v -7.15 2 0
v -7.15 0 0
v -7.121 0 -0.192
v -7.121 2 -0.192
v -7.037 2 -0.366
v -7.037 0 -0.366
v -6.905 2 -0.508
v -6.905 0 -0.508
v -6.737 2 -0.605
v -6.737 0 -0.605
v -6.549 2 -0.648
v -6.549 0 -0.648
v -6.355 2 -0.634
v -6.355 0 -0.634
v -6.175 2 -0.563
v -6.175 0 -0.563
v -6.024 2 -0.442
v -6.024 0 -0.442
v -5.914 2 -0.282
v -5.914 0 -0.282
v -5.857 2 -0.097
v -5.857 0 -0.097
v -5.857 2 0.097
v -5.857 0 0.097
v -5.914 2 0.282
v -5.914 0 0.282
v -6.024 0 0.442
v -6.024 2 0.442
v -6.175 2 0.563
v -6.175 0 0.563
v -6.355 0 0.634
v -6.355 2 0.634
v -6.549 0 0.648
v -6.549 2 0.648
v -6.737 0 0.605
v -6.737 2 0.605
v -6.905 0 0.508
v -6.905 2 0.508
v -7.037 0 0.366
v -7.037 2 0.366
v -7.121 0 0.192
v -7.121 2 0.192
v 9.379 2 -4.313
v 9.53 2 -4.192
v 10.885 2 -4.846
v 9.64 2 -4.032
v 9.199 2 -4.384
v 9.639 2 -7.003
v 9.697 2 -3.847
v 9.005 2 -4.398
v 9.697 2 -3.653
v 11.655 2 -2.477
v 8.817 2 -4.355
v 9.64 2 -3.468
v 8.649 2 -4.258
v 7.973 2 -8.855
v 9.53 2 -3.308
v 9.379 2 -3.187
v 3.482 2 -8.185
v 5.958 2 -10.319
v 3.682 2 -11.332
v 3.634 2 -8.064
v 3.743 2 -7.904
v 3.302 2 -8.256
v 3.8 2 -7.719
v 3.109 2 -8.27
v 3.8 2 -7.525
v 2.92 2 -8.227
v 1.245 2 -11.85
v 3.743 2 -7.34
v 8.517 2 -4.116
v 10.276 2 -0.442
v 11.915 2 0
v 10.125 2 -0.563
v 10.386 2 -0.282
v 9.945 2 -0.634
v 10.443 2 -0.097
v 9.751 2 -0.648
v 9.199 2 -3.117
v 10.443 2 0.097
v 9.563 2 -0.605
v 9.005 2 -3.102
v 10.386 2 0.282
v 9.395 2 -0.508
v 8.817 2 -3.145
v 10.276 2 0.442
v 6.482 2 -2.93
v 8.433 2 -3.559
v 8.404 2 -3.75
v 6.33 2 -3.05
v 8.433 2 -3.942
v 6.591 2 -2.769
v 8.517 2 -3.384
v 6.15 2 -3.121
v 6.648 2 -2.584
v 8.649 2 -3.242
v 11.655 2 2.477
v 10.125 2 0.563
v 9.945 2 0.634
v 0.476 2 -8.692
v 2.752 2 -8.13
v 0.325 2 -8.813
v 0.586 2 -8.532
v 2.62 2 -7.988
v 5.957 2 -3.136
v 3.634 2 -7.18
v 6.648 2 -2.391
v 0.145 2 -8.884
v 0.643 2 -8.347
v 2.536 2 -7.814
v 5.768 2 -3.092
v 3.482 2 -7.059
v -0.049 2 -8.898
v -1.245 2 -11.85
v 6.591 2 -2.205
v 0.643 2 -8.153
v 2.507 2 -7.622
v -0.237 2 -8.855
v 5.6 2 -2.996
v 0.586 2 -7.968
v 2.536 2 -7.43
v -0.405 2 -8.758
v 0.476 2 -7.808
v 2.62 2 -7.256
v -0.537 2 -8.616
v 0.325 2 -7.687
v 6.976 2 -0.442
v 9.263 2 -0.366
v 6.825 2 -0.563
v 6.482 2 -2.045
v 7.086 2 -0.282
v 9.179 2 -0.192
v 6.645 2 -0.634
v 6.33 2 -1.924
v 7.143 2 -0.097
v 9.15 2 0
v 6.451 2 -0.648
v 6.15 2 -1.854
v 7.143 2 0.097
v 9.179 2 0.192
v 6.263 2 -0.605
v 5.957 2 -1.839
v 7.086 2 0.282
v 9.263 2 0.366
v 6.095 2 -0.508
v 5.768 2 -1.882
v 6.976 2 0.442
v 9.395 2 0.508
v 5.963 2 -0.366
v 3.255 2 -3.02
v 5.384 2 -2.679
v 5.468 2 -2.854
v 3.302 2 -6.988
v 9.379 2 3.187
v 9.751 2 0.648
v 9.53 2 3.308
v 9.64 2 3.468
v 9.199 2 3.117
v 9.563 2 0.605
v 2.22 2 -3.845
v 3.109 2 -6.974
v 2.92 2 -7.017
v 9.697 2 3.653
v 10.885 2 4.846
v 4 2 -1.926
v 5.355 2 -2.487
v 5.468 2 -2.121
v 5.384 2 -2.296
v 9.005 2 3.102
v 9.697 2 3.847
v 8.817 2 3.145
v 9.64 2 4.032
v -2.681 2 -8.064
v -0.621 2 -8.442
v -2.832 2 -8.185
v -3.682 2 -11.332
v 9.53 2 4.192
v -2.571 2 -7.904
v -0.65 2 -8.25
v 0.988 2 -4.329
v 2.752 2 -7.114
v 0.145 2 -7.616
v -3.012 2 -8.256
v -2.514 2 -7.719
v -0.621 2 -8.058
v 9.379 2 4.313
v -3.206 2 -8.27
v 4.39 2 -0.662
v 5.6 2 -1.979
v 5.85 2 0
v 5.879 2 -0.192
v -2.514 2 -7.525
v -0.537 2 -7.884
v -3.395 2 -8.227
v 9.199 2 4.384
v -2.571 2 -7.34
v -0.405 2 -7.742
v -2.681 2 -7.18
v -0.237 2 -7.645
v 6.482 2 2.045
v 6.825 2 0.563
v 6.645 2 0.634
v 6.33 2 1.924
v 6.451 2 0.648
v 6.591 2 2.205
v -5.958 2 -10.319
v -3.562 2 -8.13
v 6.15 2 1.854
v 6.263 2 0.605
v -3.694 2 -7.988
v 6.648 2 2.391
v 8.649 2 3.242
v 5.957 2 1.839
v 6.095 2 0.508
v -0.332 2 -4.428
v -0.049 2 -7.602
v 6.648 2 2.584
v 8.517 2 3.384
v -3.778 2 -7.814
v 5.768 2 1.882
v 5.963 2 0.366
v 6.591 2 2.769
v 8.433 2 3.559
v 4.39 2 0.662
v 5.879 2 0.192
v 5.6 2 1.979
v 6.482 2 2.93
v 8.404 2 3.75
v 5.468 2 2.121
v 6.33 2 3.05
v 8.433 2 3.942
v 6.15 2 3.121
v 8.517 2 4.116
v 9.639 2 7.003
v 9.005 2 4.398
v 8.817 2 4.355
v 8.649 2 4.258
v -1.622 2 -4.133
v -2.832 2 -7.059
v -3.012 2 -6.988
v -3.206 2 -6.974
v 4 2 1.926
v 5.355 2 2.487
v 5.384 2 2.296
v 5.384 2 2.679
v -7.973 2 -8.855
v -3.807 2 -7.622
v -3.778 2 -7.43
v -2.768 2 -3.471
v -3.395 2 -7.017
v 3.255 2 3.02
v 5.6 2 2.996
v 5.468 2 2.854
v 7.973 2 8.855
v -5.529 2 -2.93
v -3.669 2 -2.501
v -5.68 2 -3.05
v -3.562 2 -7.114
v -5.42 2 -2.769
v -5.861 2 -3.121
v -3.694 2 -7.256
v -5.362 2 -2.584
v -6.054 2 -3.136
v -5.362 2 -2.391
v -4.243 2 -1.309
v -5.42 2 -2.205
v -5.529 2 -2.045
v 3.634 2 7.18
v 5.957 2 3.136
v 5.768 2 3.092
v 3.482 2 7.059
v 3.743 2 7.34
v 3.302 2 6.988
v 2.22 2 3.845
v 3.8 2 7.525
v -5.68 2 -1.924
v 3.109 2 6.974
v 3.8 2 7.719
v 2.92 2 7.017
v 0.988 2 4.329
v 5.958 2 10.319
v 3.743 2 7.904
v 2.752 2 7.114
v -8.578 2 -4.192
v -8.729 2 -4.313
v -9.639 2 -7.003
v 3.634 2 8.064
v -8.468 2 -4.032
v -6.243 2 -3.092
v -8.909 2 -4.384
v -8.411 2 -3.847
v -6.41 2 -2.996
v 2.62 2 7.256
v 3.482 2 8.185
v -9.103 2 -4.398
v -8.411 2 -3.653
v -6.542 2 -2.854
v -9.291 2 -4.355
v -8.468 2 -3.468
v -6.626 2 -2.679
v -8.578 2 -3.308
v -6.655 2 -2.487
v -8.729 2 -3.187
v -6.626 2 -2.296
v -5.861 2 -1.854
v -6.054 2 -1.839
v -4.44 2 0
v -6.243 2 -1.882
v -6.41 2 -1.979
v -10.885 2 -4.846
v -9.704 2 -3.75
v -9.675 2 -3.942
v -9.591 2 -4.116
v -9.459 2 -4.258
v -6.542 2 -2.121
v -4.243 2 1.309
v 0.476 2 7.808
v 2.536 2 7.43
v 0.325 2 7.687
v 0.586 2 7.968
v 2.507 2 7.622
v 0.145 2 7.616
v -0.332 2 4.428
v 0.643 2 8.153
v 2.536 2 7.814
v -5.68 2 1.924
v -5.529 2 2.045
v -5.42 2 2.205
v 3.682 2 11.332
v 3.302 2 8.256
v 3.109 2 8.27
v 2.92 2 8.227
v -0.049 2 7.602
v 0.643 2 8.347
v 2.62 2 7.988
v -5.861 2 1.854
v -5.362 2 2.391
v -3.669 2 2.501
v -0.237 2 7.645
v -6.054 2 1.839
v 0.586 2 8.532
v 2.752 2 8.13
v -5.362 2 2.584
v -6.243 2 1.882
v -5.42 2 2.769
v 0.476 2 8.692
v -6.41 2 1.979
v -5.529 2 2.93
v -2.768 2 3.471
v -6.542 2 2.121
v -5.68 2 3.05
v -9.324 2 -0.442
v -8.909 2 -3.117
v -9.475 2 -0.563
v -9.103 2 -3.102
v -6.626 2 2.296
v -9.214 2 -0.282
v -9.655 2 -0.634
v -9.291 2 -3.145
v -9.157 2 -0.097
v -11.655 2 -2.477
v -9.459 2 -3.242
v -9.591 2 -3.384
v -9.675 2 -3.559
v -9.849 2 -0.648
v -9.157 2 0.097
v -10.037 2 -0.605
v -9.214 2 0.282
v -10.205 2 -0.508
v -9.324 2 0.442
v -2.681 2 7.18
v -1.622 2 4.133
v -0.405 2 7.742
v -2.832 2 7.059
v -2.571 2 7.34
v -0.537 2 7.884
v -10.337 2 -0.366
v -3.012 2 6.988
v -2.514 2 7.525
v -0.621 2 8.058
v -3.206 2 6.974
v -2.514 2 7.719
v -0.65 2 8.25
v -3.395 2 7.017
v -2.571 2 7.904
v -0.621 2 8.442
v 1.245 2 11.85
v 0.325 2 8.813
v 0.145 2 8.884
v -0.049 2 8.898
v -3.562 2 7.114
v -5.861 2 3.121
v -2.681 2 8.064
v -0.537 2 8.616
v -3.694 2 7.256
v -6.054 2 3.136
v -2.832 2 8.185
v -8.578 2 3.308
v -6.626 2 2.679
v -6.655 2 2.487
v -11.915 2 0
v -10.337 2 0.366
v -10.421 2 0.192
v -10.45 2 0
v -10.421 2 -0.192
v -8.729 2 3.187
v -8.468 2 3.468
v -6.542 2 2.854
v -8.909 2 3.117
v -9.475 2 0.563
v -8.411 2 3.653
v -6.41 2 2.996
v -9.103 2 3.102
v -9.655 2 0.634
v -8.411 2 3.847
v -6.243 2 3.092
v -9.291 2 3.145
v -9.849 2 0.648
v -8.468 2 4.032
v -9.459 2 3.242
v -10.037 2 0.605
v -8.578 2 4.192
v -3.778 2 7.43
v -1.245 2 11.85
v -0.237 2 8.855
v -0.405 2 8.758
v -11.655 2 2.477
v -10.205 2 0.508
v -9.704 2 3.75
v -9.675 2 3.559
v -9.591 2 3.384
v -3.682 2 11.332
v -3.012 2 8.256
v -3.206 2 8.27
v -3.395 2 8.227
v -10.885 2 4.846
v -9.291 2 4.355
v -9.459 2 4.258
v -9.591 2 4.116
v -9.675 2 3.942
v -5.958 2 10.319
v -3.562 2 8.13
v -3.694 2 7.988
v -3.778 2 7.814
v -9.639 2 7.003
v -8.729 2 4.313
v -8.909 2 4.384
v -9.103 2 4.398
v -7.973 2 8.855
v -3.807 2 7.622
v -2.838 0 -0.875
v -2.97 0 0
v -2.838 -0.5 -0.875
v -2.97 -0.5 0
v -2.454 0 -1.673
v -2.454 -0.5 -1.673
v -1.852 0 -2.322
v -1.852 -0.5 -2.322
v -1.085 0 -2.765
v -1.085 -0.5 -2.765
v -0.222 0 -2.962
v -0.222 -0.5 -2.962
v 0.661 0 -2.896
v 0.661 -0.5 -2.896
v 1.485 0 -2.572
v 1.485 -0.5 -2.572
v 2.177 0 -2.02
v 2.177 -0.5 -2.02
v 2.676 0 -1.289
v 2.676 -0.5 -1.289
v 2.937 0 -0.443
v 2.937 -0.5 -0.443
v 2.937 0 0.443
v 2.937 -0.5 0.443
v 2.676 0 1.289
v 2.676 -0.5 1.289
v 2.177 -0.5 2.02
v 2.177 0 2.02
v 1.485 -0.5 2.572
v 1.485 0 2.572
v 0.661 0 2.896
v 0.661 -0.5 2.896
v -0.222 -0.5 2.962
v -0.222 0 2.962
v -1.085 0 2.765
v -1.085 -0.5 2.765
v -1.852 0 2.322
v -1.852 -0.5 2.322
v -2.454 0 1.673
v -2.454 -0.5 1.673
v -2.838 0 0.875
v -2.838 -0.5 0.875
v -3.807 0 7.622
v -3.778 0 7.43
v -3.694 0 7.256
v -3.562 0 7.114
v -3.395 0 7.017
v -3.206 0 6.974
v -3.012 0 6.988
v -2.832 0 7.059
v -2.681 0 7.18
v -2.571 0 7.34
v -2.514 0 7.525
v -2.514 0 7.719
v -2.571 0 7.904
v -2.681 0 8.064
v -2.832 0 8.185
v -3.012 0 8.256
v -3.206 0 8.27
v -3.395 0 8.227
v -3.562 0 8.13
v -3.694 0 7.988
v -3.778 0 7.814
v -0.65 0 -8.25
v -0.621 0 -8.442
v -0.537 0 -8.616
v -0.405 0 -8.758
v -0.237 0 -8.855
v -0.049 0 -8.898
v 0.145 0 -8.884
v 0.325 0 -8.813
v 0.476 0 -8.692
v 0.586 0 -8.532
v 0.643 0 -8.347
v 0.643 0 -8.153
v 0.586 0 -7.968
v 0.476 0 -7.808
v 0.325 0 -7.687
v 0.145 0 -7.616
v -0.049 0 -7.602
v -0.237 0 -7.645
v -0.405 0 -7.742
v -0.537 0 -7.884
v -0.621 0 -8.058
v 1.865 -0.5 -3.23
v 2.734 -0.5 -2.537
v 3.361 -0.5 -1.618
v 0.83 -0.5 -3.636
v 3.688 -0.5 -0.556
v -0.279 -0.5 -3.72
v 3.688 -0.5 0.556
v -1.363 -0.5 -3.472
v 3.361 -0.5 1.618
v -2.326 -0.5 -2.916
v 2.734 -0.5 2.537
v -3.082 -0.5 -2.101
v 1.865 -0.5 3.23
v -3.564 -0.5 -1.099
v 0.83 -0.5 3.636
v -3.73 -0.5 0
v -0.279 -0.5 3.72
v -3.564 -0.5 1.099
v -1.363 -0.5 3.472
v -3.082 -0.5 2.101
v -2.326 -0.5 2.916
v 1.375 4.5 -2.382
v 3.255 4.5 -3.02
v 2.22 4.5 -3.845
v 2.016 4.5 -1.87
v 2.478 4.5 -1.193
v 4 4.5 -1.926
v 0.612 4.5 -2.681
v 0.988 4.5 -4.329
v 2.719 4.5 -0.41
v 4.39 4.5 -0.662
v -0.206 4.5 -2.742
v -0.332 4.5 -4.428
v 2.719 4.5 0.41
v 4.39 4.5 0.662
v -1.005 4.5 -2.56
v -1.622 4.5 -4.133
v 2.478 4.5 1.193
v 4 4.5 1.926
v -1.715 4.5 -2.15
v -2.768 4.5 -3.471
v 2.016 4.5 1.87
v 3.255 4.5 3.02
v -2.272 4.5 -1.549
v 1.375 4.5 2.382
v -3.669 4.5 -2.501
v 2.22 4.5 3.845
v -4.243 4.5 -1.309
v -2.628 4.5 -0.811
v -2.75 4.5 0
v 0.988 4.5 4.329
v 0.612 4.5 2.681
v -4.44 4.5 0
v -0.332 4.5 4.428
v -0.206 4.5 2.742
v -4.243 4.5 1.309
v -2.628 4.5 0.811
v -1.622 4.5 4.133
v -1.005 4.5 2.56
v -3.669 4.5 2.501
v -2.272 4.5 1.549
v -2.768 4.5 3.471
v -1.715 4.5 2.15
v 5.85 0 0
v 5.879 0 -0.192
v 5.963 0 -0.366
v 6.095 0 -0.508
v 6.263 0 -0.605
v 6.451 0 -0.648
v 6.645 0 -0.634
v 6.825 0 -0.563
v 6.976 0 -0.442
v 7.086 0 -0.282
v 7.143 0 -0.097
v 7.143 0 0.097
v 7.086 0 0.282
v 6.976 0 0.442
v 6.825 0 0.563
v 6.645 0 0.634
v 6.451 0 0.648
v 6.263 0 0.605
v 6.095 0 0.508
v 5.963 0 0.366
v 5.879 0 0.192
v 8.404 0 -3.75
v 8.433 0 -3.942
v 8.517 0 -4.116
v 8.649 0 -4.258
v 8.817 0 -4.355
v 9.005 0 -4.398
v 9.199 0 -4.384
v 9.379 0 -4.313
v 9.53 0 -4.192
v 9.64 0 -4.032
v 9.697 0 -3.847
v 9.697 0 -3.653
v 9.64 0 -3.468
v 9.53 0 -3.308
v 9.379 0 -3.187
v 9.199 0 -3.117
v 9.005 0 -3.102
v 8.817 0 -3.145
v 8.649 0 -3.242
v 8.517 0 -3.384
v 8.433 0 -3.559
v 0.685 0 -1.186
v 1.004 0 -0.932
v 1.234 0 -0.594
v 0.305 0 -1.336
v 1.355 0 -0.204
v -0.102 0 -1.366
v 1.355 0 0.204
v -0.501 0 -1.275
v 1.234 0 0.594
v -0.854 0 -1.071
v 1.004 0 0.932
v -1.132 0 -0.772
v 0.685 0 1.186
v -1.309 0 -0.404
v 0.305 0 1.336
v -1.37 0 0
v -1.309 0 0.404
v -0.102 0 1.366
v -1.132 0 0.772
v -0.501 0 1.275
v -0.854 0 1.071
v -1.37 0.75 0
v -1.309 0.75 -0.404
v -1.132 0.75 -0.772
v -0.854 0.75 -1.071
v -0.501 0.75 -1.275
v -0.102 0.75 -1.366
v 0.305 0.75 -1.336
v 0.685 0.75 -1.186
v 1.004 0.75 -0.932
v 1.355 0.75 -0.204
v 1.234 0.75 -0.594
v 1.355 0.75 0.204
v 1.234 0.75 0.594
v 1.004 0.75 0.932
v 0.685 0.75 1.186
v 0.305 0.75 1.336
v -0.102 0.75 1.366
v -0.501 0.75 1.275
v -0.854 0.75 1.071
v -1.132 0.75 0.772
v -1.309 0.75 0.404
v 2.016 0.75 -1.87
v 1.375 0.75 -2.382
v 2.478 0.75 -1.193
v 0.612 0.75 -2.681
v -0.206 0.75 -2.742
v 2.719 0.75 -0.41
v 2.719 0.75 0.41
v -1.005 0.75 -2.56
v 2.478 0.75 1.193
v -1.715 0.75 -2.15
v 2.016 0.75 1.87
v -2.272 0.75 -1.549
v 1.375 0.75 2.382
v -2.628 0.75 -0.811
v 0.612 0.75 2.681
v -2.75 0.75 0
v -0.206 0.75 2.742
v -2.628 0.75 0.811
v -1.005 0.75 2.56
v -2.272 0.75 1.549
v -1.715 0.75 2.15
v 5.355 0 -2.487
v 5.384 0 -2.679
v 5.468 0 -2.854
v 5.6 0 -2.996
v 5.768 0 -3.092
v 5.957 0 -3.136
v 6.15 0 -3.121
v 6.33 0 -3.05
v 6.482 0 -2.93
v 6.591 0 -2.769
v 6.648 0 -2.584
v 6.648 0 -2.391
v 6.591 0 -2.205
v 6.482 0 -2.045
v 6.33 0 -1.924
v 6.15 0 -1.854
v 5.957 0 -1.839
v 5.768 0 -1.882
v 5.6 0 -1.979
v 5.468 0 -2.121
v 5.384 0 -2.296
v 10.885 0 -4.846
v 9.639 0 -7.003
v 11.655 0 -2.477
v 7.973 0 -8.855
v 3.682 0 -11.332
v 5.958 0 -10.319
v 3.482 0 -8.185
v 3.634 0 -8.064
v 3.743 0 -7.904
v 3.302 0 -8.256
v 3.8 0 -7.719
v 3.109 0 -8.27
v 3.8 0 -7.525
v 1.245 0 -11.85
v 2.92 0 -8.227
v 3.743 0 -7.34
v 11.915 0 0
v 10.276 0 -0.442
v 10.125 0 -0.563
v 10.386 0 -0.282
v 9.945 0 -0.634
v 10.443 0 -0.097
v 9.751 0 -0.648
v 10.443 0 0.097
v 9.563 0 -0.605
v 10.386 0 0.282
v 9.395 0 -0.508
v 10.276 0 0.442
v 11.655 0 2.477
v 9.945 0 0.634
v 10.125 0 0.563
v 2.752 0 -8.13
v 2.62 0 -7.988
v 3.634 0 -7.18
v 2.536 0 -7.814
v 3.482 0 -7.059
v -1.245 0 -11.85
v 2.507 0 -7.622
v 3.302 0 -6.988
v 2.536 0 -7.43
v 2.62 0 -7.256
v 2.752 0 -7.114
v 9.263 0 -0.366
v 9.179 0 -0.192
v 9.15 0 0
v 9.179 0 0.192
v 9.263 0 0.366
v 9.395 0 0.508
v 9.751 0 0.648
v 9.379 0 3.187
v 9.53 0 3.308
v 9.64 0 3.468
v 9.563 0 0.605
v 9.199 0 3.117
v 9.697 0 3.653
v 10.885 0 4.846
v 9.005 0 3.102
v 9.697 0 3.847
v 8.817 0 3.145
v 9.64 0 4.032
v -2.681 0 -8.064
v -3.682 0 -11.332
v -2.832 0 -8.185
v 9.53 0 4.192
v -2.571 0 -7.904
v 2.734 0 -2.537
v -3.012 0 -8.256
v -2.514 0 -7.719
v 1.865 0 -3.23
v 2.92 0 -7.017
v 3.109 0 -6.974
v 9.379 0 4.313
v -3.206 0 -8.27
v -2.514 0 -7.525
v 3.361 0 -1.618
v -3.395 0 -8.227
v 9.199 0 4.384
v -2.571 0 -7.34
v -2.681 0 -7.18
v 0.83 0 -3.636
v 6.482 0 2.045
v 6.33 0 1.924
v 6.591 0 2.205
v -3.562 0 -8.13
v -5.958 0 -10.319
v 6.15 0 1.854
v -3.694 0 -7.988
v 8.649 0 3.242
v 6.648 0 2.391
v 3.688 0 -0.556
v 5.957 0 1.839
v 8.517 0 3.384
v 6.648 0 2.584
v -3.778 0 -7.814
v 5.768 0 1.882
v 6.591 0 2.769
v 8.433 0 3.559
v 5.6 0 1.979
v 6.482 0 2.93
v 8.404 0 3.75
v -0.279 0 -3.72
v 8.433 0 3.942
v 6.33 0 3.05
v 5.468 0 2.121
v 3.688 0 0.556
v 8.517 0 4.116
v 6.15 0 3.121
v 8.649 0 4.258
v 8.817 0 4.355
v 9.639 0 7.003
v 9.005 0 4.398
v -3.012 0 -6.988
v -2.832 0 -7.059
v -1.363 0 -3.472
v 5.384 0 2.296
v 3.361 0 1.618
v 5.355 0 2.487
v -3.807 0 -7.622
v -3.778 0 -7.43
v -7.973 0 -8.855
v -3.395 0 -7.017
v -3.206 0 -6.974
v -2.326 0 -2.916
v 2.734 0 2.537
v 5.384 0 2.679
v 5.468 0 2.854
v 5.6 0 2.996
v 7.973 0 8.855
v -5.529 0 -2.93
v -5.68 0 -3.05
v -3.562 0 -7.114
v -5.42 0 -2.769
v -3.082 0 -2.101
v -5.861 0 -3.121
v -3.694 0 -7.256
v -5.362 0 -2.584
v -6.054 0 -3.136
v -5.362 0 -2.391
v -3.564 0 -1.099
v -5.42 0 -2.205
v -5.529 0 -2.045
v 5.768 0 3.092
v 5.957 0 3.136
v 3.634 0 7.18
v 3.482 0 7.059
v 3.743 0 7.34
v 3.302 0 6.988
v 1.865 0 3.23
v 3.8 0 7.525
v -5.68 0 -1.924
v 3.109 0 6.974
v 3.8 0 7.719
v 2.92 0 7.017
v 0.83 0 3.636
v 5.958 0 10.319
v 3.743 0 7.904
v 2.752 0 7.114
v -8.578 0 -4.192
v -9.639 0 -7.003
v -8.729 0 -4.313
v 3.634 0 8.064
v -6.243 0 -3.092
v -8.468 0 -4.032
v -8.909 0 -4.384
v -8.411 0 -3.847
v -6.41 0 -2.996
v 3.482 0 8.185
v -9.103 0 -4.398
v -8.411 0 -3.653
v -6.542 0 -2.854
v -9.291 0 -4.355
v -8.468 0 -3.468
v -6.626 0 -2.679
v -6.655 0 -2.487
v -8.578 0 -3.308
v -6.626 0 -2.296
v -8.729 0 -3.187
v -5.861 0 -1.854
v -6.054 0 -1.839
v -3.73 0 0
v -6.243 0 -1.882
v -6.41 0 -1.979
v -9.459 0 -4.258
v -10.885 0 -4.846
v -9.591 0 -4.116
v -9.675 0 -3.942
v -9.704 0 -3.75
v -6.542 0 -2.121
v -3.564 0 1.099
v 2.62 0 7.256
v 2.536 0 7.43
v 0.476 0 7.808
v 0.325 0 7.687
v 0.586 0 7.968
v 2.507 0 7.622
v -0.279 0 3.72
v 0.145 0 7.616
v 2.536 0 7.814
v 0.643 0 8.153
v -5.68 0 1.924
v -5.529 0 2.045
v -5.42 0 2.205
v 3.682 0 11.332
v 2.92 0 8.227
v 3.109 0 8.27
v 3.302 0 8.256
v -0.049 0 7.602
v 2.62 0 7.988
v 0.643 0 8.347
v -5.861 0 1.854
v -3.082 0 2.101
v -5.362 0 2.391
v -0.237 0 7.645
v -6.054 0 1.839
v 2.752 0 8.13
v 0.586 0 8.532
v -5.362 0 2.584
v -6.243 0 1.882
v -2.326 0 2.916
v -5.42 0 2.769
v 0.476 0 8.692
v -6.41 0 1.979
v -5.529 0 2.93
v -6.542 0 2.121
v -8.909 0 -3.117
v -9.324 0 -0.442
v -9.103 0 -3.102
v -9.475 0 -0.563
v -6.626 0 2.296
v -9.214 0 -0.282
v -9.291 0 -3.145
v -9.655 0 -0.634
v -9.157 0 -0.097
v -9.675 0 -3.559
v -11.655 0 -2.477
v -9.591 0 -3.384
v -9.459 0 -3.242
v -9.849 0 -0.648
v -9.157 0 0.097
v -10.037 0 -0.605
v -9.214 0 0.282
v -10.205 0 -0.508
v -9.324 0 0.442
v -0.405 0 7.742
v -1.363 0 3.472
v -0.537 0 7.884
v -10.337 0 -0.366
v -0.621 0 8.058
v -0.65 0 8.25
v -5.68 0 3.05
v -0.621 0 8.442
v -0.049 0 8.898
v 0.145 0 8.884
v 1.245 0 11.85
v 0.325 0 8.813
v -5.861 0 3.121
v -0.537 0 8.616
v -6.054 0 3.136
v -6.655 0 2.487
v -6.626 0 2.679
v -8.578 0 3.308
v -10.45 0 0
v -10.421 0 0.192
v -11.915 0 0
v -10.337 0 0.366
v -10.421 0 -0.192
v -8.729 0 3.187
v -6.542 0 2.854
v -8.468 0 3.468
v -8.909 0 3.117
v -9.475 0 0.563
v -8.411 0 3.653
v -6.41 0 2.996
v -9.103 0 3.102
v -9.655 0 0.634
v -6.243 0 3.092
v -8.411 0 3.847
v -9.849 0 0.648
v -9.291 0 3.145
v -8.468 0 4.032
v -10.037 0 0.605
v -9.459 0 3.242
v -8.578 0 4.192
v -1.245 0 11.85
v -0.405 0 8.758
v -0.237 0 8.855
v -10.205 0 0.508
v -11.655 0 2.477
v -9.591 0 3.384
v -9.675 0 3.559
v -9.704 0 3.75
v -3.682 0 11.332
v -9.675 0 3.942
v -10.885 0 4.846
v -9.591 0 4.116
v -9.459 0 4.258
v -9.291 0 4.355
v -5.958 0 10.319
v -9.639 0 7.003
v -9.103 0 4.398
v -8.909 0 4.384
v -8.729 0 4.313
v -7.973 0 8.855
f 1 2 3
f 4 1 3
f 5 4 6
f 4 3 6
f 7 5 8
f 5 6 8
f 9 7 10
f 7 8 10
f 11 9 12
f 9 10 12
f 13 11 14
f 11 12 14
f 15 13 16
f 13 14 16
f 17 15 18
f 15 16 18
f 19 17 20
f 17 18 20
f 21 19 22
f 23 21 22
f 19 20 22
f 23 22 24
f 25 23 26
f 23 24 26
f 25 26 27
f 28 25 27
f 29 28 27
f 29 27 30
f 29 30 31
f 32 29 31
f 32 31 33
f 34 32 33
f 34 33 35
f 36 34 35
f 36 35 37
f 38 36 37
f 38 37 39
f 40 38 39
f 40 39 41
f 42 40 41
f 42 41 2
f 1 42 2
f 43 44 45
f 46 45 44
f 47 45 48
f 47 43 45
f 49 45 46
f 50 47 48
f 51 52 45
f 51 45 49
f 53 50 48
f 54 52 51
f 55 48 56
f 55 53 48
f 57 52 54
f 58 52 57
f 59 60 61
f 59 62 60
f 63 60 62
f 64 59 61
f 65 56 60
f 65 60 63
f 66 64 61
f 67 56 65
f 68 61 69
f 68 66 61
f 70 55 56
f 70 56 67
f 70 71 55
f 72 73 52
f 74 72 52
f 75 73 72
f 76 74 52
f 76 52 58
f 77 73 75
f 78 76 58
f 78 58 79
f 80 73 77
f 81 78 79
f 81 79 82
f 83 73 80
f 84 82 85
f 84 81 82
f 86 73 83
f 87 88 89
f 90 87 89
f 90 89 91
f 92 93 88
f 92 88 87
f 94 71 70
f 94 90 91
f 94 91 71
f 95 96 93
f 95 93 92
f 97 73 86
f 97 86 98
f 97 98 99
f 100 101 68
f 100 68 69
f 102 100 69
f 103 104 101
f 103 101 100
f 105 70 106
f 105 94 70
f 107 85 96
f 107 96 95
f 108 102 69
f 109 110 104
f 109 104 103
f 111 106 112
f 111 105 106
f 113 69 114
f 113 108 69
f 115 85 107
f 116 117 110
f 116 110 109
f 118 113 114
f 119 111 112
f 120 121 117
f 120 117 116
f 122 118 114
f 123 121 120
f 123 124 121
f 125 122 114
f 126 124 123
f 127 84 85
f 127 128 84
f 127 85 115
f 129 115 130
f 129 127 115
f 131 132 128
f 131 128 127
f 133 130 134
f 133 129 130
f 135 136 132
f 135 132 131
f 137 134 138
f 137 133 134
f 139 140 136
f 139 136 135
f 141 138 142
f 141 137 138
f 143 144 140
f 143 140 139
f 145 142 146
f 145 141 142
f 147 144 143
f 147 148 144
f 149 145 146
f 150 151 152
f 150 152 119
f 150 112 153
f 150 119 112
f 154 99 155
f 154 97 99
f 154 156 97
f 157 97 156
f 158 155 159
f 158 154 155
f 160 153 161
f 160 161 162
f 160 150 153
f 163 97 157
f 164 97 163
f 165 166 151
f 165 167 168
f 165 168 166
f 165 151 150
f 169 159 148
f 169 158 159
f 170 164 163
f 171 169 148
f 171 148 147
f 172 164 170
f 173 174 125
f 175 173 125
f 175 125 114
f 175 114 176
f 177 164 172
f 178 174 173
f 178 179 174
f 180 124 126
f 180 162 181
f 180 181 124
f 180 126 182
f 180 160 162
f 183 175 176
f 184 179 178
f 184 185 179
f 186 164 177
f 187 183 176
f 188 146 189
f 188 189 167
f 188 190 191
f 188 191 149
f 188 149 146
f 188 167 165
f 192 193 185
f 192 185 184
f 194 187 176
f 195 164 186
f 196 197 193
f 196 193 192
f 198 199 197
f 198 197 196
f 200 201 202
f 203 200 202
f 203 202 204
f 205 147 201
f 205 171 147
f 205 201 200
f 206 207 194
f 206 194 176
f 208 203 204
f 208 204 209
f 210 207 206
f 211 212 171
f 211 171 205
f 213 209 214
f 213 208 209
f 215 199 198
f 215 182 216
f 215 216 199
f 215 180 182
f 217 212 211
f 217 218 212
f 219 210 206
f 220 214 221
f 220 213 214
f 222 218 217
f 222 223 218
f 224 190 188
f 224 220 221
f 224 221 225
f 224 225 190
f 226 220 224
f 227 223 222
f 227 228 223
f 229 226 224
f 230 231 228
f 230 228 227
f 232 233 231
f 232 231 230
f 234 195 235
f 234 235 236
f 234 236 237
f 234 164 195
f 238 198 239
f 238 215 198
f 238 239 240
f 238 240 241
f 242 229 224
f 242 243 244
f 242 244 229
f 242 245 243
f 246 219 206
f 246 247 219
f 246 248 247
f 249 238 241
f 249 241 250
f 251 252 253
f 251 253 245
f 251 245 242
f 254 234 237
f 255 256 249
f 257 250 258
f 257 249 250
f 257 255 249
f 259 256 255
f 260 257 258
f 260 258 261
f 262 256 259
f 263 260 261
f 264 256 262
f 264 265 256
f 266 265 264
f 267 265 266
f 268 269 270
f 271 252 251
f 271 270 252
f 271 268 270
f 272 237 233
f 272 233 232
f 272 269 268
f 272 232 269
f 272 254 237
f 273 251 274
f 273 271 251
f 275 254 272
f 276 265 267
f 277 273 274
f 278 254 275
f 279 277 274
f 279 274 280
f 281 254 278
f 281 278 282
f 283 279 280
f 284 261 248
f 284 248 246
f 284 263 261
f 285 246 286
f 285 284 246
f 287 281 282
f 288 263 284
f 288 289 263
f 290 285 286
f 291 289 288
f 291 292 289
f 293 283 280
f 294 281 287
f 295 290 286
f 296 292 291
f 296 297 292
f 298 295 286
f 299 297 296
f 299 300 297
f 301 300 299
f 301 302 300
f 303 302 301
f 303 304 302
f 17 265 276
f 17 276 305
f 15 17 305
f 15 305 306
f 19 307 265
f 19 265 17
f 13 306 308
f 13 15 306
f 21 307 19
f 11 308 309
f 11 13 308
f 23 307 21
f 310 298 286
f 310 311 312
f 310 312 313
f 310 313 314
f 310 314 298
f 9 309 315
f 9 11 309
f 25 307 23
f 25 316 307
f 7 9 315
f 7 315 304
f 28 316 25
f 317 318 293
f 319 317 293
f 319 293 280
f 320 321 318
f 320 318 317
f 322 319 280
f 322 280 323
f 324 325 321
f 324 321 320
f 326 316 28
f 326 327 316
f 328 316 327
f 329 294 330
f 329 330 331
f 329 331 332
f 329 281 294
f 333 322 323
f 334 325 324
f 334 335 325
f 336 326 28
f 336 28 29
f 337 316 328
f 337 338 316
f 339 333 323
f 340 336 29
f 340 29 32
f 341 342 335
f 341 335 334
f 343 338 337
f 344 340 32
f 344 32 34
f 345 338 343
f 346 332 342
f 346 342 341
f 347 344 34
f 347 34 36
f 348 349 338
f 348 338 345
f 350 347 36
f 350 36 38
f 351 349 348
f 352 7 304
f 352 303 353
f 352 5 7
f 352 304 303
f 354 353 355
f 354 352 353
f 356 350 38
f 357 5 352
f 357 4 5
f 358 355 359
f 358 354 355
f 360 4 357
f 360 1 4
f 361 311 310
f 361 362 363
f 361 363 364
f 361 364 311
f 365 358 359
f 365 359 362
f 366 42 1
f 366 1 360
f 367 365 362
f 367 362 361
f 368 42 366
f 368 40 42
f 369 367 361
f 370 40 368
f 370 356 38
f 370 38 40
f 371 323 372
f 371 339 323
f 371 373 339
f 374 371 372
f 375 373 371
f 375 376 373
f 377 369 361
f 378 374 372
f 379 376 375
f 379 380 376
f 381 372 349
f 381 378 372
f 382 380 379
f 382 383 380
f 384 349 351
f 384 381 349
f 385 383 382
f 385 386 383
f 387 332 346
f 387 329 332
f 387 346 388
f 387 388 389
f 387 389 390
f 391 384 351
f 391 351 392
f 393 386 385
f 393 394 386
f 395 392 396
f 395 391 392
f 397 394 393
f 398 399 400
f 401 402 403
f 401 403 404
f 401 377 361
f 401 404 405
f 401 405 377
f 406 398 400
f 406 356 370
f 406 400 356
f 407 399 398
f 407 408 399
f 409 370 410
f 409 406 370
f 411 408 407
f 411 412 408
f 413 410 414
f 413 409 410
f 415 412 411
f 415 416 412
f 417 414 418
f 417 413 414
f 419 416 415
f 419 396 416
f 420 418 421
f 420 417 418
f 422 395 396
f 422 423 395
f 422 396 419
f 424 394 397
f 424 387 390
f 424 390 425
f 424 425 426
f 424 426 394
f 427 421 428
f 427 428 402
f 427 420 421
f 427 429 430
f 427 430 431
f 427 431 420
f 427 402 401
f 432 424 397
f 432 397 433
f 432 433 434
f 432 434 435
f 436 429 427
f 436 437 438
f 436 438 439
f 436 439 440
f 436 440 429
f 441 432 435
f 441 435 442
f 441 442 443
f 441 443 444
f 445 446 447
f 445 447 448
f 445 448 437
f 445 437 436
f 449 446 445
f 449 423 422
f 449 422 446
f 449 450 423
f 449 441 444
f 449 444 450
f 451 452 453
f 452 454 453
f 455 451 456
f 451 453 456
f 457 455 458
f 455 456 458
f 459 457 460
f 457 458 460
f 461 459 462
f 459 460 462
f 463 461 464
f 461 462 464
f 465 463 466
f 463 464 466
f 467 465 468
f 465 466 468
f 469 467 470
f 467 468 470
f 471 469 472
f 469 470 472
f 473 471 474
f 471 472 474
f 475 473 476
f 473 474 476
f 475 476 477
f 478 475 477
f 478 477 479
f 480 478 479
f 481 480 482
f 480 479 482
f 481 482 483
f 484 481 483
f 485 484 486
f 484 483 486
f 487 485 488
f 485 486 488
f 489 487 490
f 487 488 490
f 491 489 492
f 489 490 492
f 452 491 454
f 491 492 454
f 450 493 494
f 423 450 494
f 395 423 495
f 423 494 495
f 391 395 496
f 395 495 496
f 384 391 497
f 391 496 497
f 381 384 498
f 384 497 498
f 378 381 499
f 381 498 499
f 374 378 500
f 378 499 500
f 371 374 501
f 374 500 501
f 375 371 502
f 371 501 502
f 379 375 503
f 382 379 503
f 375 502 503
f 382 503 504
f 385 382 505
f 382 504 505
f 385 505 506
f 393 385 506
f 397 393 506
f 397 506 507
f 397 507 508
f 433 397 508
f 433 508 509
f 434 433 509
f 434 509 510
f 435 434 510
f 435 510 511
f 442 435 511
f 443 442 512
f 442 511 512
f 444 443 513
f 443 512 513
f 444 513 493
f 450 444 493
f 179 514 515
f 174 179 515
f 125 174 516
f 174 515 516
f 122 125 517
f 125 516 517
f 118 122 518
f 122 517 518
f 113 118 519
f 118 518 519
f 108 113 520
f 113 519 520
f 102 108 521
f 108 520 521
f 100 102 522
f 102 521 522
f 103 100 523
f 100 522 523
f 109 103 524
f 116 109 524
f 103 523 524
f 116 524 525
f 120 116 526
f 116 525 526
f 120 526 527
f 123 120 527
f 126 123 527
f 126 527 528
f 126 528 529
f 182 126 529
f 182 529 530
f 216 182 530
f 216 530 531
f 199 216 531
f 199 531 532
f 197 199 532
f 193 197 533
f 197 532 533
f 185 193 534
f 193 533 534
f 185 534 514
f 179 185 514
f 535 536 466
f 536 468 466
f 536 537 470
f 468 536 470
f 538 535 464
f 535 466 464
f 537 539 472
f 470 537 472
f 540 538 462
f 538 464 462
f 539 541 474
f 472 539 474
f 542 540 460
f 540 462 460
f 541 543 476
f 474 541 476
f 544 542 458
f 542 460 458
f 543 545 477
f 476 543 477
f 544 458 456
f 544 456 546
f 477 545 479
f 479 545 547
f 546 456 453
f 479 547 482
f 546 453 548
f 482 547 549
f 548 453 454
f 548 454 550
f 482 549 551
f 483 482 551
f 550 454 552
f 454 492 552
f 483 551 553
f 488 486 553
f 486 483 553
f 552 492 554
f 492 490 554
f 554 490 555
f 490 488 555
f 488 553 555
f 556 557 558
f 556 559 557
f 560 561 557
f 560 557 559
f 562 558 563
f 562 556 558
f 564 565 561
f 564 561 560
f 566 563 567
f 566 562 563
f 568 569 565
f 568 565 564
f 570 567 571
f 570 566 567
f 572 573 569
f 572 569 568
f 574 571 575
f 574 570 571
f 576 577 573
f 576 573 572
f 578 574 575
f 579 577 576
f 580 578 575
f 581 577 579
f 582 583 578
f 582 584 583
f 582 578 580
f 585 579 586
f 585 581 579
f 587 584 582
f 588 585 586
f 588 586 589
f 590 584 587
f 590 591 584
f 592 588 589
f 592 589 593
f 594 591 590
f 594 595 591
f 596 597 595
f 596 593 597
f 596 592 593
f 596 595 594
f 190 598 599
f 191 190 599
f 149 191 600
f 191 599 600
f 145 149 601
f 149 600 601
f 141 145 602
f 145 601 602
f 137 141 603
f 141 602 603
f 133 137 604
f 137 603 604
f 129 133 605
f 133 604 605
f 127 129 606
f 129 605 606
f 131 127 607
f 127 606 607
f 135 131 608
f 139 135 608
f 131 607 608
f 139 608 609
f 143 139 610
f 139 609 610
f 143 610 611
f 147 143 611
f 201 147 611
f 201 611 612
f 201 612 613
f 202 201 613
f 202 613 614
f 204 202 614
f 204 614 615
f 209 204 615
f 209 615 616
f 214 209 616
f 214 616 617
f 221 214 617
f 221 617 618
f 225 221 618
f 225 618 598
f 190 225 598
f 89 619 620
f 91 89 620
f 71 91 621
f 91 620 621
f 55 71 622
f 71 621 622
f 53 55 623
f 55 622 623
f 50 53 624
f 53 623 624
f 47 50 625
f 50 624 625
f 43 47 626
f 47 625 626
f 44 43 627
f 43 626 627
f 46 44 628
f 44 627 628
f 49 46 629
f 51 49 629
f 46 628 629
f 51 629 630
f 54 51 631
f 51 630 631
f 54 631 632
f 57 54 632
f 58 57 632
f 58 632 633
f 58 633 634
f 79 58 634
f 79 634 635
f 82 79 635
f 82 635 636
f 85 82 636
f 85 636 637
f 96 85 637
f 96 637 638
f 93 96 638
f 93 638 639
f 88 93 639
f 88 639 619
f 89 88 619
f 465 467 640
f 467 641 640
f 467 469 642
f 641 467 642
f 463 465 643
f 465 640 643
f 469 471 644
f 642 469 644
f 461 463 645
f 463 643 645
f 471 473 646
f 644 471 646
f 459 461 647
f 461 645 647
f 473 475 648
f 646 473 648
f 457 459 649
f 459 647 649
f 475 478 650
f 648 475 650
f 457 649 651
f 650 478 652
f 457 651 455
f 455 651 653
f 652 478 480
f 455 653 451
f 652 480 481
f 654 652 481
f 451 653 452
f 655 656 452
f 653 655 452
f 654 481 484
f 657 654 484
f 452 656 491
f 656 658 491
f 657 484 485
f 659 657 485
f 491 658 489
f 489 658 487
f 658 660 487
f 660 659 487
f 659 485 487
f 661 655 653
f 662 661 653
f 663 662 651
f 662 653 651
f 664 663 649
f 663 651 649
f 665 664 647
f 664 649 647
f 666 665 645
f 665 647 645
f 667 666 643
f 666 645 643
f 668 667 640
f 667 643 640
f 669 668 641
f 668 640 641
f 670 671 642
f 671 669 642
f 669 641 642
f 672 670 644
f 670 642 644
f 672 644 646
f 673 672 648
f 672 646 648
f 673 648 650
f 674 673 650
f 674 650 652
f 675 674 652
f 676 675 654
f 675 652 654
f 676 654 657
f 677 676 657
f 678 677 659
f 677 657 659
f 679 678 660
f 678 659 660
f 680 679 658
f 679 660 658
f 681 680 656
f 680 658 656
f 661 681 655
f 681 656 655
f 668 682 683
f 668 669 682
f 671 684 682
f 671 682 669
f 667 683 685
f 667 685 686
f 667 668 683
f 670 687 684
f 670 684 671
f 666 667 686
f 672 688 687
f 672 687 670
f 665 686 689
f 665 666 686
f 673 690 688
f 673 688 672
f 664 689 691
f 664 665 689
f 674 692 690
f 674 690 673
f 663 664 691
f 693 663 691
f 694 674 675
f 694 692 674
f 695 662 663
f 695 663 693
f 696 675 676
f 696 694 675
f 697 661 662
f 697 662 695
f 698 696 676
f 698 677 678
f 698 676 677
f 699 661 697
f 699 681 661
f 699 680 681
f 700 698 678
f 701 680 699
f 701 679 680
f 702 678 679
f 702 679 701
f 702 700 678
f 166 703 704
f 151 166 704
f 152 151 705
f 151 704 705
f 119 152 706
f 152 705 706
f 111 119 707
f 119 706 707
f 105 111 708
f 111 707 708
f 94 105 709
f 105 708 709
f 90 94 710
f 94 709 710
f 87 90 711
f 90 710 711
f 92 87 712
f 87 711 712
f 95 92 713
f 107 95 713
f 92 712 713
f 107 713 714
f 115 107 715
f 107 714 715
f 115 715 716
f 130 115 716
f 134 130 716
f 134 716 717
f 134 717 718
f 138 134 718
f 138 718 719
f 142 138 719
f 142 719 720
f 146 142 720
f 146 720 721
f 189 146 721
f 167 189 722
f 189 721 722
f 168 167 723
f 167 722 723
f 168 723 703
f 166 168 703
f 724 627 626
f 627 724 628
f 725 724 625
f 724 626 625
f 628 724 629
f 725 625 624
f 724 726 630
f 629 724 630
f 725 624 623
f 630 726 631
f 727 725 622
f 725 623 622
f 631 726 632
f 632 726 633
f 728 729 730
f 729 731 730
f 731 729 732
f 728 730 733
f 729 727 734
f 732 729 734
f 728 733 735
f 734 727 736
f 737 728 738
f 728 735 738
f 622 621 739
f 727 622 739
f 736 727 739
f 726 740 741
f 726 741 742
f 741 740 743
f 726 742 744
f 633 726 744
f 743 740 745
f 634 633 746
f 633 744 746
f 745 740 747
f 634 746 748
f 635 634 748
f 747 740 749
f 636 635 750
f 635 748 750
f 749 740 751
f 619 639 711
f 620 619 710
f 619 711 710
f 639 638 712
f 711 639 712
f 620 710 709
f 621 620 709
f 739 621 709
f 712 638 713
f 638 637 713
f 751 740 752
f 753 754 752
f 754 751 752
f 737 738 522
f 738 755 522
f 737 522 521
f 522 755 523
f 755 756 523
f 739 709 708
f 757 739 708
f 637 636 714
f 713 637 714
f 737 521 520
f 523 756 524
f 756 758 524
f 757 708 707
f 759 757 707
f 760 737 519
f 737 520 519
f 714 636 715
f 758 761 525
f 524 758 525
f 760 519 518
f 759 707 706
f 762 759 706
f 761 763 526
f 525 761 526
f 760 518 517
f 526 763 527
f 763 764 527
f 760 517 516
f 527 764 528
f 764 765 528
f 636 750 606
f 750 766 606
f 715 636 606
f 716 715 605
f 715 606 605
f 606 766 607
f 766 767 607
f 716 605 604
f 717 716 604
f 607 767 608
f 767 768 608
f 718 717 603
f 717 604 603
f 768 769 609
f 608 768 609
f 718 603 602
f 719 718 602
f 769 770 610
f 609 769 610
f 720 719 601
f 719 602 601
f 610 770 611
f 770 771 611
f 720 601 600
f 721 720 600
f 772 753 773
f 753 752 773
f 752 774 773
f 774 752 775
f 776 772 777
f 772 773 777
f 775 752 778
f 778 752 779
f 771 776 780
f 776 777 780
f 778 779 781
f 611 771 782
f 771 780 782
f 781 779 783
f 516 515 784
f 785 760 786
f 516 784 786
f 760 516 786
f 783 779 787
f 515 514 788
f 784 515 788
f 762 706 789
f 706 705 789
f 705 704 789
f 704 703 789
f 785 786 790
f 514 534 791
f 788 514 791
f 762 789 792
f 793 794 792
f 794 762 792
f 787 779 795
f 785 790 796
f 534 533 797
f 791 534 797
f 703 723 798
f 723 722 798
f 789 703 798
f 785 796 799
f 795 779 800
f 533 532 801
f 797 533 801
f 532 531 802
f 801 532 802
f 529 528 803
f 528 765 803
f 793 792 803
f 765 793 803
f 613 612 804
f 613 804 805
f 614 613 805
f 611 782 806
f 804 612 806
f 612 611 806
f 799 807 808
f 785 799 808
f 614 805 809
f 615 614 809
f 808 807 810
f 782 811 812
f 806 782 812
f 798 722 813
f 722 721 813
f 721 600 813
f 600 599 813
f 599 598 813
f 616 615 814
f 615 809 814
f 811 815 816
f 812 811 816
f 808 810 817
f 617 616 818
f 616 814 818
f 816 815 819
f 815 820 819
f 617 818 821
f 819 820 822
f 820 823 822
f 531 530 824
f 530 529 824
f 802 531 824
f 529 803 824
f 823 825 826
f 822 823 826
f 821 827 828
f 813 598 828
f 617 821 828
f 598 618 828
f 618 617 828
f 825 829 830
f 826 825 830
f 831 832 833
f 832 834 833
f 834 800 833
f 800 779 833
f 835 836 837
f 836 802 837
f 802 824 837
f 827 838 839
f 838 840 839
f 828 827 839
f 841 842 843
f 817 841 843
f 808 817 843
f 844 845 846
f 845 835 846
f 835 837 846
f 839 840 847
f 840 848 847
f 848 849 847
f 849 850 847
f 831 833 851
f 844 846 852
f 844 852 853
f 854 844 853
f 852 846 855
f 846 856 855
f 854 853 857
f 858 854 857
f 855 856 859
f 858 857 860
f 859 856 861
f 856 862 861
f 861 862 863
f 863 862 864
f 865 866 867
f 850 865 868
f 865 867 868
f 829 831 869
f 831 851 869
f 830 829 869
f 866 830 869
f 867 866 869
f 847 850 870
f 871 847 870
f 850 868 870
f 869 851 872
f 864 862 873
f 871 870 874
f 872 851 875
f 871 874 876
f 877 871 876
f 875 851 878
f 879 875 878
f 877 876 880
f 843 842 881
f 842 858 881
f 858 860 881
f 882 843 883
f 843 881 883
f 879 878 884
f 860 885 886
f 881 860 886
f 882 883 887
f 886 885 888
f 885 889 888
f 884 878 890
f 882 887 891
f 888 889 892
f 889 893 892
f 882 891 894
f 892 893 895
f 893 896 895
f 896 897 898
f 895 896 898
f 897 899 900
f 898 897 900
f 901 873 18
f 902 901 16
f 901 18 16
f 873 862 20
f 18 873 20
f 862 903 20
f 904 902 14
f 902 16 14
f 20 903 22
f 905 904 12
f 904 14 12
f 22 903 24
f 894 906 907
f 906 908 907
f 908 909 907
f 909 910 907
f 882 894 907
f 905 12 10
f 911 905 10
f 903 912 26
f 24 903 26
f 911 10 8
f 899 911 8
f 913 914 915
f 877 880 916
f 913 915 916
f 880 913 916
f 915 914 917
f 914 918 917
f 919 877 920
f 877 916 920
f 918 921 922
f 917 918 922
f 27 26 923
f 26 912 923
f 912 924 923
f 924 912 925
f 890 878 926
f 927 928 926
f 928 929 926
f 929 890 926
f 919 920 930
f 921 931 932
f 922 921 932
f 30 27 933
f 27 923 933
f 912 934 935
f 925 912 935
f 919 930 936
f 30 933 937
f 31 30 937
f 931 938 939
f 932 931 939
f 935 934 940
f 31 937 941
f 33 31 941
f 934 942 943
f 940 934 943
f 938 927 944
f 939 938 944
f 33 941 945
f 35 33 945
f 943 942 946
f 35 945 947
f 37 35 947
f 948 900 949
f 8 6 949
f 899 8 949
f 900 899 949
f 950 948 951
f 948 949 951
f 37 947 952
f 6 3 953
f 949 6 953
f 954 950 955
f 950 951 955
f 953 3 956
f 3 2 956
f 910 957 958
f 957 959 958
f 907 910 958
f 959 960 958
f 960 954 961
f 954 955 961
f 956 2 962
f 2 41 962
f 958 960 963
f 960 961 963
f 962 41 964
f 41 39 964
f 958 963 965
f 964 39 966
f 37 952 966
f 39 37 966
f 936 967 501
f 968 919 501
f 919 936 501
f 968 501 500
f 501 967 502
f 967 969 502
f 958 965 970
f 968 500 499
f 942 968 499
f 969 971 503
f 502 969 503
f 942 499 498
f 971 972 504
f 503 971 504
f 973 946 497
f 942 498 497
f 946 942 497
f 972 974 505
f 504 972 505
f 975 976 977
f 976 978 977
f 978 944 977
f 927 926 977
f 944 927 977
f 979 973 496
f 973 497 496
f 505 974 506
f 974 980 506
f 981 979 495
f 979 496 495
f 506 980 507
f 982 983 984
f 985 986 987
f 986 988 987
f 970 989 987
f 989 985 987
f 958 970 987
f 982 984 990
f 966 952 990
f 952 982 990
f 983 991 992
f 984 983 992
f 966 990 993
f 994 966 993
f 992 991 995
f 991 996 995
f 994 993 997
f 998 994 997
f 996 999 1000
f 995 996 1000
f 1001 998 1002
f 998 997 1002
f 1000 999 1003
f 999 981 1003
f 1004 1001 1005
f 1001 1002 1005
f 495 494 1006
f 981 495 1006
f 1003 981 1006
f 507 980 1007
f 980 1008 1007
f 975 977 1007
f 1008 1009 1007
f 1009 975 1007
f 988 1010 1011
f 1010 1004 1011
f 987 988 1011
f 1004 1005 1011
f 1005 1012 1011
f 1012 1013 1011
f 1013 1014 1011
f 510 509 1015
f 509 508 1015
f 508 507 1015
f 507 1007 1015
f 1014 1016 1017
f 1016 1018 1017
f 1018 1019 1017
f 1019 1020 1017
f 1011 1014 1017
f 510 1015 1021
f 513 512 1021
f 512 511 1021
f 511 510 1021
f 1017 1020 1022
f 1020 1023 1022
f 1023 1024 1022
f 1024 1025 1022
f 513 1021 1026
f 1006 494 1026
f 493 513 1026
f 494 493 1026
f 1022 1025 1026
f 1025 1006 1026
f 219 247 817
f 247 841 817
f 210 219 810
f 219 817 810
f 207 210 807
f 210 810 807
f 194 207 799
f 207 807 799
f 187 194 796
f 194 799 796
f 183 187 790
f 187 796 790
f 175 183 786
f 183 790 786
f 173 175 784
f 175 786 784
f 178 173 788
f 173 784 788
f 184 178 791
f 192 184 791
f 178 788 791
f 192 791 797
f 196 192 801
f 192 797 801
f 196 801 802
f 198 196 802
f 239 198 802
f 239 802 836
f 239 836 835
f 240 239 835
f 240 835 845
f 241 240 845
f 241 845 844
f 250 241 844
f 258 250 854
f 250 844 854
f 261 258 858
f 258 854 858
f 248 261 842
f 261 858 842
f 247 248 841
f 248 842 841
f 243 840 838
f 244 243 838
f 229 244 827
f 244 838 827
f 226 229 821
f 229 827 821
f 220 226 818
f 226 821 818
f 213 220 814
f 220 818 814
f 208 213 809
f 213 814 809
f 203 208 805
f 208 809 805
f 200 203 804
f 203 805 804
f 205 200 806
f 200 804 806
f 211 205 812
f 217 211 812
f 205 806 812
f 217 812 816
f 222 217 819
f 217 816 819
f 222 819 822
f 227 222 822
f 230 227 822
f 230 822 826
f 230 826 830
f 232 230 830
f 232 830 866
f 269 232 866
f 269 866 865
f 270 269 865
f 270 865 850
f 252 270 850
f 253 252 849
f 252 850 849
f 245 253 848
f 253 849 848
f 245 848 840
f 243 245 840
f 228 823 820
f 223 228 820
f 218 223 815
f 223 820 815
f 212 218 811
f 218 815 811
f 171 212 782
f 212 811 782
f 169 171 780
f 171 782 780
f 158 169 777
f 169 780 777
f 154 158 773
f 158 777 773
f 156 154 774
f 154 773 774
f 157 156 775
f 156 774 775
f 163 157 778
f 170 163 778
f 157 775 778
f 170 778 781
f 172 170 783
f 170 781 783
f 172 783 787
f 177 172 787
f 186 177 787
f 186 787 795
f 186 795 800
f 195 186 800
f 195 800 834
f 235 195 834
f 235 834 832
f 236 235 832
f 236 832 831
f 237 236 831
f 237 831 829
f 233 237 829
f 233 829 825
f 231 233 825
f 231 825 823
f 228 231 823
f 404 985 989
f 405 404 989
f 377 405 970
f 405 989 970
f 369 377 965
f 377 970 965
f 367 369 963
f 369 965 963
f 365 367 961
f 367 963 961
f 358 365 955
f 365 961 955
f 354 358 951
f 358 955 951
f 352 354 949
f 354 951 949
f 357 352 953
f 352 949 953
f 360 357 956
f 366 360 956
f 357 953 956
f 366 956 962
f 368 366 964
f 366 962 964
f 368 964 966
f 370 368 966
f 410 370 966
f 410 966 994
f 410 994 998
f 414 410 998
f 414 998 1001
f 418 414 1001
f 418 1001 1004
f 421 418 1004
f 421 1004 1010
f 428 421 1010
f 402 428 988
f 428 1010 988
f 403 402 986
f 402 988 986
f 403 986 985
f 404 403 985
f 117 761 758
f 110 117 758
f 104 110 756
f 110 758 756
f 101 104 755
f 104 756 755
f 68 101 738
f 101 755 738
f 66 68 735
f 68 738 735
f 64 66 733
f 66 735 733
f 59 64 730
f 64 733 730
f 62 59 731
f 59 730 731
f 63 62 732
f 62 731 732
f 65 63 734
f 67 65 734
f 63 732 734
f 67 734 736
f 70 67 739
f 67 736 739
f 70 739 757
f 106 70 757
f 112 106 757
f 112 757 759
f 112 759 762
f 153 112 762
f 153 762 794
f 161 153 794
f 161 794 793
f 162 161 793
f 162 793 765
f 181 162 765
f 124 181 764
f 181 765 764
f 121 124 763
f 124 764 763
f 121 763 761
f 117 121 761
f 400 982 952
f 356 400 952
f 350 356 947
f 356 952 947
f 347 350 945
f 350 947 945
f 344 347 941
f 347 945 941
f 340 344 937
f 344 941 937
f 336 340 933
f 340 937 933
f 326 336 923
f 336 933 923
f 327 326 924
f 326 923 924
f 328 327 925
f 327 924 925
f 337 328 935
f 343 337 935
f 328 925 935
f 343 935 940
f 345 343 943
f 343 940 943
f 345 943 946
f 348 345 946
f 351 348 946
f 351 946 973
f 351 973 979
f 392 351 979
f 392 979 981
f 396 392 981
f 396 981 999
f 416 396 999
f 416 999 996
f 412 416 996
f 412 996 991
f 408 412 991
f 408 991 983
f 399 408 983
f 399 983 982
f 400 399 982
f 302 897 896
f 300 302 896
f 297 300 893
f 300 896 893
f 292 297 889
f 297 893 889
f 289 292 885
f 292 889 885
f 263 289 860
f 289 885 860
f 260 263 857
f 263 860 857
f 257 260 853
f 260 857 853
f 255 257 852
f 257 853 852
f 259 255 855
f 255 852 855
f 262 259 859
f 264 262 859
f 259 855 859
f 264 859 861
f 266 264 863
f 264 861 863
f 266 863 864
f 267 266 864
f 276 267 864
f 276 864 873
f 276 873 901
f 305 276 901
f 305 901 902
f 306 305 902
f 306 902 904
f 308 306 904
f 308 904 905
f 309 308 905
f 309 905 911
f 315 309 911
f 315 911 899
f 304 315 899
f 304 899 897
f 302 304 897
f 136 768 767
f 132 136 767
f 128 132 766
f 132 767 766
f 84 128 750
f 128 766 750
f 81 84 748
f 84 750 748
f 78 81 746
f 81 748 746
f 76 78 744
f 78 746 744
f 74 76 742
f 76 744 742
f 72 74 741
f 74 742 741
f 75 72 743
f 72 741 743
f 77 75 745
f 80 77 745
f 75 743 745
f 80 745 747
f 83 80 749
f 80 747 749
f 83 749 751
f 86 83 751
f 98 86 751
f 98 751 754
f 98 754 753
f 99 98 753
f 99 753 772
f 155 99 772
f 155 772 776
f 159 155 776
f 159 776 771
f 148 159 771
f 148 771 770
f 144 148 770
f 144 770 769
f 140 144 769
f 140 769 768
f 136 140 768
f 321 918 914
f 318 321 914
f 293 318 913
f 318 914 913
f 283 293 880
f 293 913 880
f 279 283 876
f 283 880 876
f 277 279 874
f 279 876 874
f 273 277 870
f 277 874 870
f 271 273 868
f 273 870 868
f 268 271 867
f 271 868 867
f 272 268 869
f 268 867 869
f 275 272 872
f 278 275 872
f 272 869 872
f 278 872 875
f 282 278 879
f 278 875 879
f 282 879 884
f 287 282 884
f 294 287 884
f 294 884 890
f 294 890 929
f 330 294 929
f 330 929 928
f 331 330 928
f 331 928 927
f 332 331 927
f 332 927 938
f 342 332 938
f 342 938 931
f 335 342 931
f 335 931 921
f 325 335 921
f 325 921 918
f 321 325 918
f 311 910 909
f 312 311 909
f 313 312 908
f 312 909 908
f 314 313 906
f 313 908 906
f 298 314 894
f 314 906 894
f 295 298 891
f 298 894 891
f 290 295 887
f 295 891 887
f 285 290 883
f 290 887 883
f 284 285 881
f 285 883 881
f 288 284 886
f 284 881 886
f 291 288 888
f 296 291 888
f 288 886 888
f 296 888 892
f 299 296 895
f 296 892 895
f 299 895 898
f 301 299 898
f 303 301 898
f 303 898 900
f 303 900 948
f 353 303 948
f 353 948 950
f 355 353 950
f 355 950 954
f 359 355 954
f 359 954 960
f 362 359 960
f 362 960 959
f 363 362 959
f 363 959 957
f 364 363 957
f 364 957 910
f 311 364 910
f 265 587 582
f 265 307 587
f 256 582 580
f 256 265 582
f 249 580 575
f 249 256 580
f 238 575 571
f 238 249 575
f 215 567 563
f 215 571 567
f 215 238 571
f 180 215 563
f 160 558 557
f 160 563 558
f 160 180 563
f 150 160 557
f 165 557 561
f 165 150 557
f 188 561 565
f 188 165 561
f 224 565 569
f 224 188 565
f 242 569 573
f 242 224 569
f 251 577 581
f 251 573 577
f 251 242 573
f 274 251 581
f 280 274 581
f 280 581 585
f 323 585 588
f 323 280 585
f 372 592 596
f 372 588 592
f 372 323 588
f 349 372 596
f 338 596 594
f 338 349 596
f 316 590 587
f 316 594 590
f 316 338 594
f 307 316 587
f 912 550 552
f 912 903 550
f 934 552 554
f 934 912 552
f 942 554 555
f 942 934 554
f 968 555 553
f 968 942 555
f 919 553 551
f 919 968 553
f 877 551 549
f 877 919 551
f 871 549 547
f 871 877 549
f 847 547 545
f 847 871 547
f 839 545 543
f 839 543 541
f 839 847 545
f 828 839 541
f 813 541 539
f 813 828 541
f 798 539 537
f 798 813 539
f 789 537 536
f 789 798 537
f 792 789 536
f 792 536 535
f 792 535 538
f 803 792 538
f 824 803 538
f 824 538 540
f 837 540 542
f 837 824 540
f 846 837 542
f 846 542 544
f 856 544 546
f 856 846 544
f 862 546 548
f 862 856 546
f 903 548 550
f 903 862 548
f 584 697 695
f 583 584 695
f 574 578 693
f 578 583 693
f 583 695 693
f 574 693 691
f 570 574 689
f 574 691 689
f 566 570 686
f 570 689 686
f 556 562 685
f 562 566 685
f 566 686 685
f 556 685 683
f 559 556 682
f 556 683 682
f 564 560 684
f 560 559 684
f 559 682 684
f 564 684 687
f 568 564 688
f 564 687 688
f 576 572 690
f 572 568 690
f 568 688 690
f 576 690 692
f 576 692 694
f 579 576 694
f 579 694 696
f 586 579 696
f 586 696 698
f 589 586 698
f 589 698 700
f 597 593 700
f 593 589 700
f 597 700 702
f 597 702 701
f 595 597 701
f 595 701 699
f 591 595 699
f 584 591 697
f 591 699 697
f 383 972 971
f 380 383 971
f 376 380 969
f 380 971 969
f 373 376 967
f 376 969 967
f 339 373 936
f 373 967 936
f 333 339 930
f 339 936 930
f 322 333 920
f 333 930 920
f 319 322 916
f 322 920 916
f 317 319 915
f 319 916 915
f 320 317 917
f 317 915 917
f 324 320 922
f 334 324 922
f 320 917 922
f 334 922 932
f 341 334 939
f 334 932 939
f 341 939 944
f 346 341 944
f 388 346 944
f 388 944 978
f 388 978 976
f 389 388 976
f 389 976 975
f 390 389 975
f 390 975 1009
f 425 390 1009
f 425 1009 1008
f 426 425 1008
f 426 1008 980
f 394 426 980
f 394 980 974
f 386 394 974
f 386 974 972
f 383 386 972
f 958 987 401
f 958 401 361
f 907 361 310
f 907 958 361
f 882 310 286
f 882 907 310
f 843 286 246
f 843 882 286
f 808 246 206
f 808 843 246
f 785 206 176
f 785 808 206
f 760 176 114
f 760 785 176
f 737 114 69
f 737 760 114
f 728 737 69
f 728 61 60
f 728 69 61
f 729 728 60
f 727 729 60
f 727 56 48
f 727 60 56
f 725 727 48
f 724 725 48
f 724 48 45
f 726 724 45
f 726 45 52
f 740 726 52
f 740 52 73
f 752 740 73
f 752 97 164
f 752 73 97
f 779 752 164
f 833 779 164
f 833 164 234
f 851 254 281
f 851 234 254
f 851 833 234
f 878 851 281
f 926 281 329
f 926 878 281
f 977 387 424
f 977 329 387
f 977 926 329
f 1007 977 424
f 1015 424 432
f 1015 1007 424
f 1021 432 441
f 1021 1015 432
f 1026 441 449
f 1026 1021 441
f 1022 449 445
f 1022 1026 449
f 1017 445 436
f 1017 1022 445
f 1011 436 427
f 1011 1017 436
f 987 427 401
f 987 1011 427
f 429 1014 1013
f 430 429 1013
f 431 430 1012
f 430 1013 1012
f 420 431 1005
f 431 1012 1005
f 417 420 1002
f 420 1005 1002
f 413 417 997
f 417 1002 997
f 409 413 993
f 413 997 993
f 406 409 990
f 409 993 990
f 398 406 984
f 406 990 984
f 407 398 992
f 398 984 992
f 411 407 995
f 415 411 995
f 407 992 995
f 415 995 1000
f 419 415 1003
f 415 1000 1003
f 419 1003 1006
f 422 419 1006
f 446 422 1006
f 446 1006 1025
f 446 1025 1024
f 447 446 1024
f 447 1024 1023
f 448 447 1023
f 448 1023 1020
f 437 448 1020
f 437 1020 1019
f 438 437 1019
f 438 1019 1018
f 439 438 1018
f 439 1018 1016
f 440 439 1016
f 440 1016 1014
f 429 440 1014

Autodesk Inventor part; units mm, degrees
ref_plane "YZ Plane" through (0, 0, 0) normal (1, 0, 0) x (0, 1, 0)
ref_plane "XZ Plane" through (0, 0, 0) normal (0, 1, 0) x (-1, 0, 0)
ref_plane "XY Plane" through (0, 0, 0) normal (0, 0, 1) x (1, 0, 0)
sketch "Sketch1" plane through (0, 0, 0) normal (0, 1, 0) x (-1, 0, 0)
  circle A0 centre (0, 0) radius 11.915
  circle A1 centre (0, 0) radius 9.8
  circle A2 centre (0, 0) radius 8.25
  circle A3 centre (0, 0) radius 6.5
  circle A4 centre (6.5, 0) radius 0.65
  circle A5 centre (9.8, 0) radius 0.65
  circle A6 centre (9.054, 3.7503) radius 0.65
  circle A7 centre (6.0052, 2.4874) radius 0.65
  circle A8 centre (9.054, -3.7503) radius 0.65
  circle A9 centre (6.0052, -2.4874) radius 0.65
  circle A10 centre (-9.054, -3.7503) radius 0.65
  circle A11 centre (-6.0052, -2.4874) radius 0.65
  circle A12 centre (-6.5, 0) radius 0.65
  circle A13 centre (-9.8, 0) radius 0.65
  circle A14 centre (-6.0052, 2.4874) radius 0.65
  circle A15 centre (-9.054, 3.7503) radius 0.65
  circle A16 centre (0, 8.25) radius 0.65
  circle A17 centre (-3.1571, 7.622) radius 0.65
  circle A18 centre (3.1571, 7.622) radius 0.65
  circle A19 centre (-3.1571, -7.622) radius 0.65
  circle A20 centre (0, -8.25) radius 0.65
  circle A21 centre (3.1571, -7.622) radius 0.65
  circle A22 centre (0, 0) radius 1.37
  circle A23 centre (0, 0) radius 2.75
  circle A24 centre (0, 0) radius 2.97
  circle A25 centre (0, 0) radius 3.73
  circle A26 centre (0, 0) radius 4.44
  dimension "d1" = 19.6
  dimension "d2" = 16.5
  dimension "d3" = 13
  dimension "d0" = 23.83
  dimension "d4" = 1.3
  dimension "d5" = 1.3
  dimension "d8" = 22.5
  dimension "d12" = 337.5
  dimension "d16" = 180
  dimension "d18" = 1.3
  dimension "d21" = 22.5
  dimension "d25" = 337.5
  dimension "d29" = 180
  dimension "d31" = 2.74
  dimension "d32" = 5.5
  dimension "d33" = 5.94
  dimension "d34" = 7.46
  dimension "d35" = 8.88
extrude "Extrusion1" add sketch "Sketch1" along normal blind 2 contours A0 | A5 A1 A8 A10 A13 A15 A6 | A2 A21 A20 A19 A17 A16 A18 | A4 A3 A9 A11 A12 A14 A7
extrude "Extrusion2" add sketch "Sketch1" along normal blind 4.5 contours A26
extrude "Extrusion3" add sketch "Sketch1" along normal blind 4.5 and the other way blind 0.5 contours A25
extrude "Extrusion4" add sketch "Sketch1" along normal blind 4.5 contours A24
extrude "Extrusion5" add sketch "Sketch1" along normal blind 0.75 contours A23
properties part number "Standard Servo Horn - White Circle"
